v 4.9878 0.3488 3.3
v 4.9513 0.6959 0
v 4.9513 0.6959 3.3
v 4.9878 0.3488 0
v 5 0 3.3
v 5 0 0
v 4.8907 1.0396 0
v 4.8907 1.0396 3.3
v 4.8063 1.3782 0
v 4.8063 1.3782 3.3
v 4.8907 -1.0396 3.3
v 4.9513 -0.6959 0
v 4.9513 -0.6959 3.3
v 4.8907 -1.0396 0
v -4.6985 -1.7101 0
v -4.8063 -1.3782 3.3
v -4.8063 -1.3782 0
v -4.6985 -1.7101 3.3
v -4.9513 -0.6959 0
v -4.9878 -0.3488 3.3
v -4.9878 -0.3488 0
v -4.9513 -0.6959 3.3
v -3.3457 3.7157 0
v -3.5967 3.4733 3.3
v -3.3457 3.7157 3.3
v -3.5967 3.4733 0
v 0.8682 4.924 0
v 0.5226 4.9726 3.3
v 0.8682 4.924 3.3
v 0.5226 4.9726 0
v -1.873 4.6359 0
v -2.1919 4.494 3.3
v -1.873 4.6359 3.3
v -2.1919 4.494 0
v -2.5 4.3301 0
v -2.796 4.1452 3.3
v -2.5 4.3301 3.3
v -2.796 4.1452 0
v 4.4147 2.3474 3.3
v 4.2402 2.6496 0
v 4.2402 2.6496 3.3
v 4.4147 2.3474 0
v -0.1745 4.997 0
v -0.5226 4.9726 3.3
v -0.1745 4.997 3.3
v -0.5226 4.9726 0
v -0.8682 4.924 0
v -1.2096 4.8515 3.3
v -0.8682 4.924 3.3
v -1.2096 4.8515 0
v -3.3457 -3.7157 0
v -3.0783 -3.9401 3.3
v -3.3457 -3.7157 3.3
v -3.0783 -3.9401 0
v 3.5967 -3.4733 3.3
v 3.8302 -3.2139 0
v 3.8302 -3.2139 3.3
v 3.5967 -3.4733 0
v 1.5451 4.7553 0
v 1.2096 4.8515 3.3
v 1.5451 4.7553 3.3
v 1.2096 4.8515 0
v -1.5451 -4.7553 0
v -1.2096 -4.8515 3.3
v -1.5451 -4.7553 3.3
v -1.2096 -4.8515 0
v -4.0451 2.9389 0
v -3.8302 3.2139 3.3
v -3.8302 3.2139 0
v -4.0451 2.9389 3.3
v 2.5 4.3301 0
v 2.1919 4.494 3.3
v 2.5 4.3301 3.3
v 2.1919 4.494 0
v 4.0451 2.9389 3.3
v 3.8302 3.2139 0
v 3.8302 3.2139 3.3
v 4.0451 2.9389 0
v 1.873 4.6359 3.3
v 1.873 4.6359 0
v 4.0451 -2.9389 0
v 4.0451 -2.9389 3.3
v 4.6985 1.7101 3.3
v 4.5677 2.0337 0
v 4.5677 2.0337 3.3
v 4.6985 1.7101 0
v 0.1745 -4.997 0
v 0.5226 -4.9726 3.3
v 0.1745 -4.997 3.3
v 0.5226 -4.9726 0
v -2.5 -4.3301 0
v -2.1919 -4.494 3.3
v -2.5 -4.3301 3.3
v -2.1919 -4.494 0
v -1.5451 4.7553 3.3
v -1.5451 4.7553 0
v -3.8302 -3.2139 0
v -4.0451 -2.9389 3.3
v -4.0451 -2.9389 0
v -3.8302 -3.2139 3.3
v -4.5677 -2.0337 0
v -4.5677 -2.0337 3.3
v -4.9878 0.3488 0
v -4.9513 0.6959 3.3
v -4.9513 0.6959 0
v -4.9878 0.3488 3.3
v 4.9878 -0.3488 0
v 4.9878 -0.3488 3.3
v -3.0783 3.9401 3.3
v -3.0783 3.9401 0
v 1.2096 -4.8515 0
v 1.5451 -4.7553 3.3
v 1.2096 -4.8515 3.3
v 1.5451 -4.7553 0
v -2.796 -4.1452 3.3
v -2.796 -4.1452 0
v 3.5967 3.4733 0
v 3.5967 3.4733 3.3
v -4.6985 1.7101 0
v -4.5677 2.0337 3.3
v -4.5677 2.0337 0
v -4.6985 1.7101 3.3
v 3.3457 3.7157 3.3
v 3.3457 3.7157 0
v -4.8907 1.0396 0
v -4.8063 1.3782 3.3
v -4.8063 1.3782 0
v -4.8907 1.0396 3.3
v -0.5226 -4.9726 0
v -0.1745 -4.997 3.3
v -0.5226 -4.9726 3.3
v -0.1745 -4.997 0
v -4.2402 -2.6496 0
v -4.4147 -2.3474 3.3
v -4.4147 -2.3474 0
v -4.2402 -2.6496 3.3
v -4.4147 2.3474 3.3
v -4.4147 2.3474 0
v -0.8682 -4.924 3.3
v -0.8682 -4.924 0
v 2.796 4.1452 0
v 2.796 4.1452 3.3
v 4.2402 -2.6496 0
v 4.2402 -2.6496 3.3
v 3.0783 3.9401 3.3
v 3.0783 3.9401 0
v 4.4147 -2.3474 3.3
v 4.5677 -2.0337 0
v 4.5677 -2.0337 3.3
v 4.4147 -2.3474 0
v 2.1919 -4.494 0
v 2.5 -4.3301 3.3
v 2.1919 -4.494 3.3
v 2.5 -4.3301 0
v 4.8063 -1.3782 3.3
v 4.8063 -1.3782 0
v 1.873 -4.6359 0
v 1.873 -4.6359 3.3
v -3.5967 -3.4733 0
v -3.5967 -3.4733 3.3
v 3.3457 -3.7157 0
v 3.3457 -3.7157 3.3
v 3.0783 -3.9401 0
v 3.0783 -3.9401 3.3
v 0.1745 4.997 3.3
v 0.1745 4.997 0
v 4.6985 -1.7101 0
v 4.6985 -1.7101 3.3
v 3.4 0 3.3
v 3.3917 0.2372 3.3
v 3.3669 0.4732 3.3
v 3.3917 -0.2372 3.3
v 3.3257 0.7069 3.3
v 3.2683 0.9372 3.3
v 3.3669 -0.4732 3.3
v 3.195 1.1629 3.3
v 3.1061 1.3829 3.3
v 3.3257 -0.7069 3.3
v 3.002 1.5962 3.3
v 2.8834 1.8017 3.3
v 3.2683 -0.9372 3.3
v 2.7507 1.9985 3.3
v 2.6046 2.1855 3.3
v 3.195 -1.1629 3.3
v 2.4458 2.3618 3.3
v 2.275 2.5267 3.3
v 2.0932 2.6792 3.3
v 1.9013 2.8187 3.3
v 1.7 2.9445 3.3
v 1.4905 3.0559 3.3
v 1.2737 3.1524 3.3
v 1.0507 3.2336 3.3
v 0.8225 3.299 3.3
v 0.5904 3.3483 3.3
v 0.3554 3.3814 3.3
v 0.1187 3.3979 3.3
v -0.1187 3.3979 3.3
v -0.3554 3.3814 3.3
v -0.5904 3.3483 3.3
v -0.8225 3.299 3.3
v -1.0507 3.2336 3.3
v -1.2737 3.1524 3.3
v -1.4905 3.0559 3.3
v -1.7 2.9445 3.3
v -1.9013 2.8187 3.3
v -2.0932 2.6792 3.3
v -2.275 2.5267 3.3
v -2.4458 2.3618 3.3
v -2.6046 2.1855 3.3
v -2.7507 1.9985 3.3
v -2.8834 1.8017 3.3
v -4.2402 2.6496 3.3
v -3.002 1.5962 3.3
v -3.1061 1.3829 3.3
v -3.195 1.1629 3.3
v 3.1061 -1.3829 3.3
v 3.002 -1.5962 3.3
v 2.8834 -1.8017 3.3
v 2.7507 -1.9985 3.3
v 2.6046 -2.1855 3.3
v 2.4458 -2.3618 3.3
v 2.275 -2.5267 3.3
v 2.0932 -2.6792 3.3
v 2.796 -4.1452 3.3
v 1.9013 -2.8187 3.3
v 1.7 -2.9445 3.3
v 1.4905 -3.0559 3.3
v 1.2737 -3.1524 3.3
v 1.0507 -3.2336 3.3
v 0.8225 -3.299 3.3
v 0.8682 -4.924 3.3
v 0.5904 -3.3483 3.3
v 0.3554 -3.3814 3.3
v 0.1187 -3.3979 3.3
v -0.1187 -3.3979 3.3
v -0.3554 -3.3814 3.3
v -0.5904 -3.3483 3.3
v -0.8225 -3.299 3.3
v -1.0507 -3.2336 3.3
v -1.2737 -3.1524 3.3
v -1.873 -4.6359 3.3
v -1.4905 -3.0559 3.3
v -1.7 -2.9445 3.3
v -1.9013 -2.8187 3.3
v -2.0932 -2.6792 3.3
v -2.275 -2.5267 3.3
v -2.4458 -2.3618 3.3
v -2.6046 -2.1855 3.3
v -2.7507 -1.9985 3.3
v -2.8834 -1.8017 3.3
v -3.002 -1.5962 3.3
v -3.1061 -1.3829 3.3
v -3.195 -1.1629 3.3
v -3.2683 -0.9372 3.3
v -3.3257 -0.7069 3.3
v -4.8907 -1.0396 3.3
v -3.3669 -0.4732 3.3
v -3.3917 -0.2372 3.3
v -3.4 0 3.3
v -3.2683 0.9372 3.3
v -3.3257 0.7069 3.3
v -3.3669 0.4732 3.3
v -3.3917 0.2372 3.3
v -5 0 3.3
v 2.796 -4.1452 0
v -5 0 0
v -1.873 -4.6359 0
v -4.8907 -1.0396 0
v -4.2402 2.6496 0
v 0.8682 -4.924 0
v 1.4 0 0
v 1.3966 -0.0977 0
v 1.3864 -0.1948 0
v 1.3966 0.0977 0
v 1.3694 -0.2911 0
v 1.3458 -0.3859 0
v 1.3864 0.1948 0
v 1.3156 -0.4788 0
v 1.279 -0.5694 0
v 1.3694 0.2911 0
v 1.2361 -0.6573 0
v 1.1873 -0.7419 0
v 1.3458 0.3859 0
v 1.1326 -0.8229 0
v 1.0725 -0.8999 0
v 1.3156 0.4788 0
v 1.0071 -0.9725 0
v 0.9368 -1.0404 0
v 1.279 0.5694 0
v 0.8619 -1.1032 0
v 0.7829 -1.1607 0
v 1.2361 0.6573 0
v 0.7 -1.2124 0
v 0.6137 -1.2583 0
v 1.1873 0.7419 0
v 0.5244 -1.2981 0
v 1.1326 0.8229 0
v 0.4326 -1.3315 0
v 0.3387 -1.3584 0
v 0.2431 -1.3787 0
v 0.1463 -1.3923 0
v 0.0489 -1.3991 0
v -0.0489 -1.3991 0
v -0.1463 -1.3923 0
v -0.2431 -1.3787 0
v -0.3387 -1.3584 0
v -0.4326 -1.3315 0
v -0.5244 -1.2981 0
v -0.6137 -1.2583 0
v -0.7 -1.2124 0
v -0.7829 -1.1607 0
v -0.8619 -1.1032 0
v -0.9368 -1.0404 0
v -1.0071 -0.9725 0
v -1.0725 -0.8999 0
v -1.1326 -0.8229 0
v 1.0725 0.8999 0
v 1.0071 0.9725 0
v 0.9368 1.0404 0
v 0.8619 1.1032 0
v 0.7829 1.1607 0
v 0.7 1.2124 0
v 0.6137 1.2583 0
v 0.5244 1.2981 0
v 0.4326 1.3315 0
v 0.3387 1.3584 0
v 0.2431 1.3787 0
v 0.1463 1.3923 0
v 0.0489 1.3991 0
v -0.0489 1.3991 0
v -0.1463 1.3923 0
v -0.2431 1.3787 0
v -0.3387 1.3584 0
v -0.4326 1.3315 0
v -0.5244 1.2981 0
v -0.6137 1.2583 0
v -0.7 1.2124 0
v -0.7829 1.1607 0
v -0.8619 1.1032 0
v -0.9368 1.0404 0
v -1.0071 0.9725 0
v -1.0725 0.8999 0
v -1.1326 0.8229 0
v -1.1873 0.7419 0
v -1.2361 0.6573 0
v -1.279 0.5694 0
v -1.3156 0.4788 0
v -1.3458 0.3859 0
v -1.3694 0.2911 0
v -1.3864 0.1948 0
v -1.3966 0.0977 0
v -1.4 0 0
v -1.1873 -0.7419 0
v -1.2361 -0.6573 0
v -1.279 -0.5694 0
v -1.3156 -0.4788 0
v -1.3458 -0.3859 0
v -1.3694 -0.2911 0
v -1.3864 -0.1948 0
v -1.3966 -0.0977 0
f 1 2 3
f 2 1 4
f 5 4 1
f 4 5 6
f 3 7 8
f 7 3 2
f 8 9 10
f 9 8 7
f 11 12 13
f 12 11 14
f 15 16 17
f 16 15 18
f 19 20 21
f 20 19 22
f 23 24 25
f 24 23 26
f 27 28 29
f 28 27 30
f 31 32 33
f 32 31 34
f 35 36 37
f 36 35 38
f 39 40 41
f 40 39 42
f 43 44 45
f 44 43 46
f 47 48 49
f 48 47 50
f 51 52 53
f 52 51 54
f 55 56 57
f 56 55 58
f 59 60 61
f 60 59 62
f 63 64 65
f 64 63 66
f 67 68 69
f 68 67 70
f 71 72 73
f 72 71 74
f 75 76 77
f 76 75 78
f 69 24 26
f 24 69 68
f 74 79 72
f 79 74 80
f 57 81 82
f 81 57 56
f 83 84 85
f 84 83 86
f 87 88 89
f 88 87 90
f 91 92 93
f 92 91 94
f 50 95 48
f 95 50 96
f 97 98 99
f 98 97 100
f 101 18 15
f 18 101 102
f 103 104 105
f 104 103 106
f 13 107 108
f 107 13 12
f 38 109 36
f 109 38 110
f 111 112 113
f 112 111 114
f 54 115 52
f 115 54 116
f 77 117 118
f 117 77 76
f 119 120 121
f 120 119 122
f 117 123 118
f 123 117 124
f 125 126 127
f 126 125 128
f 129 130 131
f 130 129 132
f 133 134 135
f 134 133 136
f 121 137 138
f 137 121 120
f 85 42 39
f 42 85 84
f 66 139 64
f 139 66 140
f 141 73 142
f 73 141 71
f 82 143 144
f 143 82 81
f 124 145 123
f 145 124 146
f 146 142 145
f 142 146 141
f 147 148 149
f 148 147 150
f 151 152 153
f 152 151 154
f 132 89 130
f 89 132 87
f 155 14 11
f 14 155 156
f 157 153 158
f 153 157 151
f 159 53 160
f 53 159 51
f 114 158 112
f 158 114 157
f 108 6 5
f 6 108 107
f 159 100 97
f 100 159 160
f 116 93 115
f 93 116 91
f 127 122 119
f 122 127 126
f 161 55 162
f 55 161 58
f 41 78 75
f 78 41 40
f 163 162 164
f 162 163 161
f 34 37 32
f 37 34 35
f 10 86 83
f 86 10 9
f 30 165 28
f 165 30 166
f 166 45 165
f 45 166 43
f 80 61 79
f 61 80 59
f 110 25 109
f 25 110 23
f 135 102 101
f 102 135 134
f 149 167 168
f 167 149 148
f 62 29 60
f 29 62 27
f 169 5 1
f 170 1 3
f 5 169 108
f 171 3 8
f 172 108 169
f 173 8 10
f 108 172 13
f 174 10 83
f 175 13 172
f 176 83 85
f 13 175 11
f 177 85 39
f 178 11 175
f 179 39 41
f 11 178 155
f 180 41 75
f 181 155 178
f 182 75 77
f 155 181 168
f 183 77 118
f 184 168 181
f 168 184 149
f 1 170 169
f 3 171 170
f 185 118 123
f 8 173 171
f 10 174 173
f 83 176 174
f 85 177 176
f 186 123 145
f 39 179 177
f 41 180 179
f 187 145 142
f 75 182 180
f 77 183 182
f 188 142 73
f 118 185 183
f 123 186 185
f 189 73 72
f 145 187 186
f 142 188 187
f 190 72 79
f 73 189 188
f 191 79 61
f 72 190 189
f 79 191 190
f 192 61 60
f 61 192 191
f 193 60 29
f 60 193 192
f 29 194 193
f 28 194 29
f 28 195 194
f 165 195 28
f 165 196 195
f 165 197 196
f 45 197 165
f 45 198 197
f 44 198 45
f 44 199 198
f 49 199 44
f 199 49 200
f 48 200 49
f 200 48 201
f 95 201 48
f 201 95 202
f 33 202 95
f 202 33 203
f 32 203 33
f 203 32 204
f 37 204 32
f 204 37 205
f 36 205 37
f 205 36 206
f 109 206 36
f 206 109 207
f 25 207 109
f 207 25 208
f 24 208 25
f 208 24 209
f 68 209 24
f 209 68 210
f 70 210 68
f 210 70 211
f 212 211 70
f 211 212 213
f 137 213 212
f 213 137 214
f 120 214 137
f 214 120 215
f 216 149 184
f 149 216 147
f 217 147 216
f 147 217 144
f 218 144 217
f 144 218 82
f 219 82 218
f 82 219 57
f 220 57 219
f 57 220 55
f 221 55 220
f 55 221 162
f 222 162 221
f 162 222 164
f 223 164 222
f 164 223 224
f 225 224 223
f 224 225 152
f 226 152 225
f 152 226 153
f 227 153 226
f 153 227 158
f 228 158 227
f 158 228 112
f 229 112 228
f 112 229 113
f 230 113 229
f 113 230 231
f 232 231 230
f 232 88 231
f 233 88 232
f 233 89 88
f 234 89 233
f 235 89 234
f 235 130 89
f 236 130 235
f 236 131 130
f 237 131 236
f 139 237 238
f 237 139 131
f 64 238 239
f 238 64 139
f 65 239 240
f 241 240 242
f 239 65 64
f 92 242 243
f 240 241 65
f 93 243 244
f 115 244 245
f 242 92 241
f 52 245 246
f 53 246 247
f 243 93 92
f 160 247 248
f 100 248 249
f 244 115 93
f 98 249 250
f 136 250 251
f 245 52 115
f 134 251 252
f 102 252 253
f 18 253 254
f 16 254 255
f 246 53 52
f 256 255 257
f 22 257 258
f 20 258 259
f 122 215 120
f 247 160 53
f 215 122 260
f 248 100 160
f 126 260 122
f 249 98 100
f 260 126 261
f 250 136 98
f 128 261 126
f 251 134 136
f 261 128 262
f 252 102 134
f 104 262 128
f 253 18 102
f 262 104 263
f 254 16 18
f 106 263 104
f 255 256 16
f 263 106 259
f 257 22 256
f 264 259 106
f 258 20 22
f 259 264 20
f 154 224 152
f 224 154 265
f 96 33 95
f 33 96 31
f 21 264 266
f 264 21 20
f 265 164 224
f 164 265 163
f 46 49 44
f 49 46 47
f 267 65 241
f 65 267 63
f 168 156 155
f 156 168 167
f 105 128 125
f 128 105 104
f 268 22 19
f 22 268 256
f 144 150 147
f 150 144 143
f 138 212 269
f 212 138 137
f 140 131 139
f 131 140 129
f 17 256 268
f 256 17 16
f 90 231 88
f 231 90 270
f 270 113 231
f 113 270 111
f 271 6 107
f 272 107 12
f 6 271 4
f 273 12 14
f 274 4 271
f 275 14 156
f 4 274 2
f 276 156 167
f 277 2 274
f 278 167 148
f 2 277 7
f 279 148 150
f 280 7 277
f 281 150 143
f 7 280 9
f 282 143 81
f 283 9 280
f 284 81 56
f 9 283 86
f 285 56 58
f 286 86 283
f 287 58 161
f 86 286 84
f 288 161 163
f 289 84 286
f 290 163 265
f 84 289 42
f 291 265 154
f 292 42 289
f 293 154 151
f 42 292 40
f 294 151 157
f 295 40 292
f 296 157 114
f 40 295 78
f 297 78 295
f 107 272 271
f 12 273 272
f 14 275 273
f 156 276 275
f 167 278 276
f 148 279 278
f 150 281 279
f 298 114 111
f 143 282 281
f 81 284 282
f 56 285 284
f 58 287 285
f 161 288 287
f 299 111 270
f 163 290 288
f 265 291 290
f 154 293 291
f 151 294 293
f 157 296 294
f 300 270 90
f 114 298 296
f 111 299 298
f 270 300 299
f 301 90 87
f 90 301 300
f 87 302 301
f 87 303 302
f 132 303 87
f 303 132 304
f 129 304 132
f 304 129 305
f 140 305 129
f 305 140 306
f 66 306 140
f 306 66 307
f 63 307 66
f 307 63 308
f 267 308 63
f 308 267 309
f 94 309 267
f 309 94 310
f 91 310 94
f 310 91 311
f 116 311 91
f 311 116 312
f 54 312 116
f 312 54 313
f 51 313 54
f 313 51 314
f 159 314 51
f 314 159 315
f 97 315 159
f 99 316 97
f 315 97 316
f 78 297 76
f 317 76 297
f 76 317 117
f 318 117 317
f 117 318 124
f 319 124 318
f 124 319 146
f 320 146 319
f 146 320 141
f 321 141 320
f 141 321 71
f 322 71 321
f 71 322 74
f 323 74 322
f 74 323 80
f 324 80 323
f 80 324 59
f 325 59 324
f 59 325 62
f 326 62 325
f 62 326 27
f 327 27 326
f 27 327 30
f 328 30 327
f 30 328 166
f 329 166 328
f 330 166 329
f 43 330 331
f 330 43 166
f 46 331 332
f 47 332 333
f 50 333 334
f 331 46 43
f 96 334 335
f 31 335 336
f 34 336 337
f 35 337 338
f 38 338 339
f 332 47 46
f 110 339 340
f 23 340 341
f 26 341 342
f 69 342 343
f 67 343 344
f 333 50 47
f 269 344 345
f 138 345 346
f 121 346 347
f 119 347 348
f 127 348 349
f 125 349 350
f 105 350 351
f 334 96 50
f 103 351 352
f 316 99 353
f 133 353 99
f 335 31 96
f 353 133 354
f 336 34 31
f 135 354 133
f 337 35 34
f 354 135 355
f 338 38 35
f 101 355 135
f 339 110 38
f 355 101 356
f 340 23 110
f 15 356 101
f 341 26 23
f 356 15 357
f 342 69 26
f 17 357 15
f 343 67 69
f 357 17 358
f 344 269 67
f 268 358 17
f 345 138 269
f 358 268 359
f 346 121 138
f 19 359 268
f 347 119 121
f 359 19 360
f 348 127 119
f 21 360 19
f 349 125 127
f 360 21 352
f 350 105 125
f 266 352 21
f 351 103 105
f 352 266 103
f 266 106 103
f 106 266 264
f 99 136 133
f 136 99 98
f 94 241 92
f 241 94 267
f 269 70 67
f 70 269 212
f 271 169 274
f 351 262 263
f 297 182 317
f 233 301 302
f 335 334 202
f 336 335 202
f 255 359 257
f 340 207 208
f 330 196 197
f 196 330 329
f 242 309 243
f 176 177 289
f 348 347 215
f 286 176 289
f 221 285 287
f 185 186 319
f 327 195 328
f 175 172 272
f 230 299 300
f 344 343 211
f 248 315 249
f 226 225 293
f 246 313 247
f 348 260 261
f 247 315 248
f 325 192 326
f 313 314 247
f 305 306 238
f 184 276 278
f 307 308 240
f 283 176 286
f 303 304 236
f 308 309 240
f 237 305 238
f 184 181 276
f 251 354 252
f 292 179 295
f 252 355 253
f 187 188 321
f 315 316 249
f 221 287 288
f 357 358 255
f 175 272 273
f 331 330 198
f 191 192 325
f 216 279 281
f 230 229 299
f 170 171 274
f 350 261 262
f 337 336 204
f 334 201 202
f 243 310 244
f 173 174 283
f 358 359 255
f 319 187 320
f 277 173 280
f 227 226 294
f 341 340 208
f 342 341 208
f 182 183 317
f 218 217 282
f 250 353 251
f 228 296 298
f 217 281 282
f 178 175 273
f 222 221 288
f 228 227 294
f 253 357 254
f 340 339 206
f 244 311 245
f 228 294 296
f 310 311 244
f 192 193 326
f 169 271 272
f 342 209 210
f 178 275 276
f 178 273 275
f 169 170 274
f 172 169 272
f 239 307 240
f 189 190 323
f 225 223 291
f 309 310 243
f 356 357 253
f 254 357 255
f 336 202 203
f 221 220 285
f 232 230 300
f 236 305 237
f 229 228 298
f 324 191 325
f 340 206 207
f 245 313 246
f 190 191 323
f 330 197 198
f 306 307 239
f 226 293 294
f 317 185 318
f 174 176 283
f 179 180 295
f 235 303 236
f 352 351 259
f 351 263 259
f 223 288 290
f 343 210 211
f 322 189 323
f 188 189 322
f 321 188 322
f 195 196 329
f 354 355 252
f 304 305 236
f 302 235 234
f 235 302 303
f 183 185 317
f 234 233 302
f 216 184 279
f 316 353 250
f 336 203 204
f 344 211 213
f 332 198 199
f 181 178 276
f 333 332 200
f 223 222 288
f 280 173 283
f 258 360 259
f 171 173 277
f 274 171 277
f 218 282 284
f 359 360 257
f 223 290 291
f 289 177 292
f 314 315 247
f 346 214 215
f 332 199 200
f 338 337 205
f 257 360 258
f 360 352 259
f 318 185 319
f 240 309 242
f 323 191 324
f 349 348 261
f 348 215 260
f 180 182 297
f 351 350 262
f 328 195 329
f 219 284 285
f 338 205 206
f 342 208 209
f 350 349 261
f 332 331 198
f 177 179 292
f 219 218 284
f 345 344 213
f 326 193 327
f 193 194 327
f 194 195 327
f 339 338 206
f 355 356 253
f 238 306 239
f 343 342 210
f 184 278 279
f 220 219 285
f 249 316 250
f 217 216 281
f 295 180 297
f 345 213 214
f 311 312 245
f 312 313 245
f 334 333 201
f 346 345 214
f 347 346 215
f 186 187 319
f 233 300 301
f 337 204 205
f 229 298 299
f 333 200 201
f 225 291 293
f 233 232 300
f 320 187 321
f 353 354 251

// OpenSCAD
$fn = 90;
height = 3.3;
difference(){
	cylinder(d=10, h=height);
	cylinder(d1=2.8, d2=6.8, h=height);
}
